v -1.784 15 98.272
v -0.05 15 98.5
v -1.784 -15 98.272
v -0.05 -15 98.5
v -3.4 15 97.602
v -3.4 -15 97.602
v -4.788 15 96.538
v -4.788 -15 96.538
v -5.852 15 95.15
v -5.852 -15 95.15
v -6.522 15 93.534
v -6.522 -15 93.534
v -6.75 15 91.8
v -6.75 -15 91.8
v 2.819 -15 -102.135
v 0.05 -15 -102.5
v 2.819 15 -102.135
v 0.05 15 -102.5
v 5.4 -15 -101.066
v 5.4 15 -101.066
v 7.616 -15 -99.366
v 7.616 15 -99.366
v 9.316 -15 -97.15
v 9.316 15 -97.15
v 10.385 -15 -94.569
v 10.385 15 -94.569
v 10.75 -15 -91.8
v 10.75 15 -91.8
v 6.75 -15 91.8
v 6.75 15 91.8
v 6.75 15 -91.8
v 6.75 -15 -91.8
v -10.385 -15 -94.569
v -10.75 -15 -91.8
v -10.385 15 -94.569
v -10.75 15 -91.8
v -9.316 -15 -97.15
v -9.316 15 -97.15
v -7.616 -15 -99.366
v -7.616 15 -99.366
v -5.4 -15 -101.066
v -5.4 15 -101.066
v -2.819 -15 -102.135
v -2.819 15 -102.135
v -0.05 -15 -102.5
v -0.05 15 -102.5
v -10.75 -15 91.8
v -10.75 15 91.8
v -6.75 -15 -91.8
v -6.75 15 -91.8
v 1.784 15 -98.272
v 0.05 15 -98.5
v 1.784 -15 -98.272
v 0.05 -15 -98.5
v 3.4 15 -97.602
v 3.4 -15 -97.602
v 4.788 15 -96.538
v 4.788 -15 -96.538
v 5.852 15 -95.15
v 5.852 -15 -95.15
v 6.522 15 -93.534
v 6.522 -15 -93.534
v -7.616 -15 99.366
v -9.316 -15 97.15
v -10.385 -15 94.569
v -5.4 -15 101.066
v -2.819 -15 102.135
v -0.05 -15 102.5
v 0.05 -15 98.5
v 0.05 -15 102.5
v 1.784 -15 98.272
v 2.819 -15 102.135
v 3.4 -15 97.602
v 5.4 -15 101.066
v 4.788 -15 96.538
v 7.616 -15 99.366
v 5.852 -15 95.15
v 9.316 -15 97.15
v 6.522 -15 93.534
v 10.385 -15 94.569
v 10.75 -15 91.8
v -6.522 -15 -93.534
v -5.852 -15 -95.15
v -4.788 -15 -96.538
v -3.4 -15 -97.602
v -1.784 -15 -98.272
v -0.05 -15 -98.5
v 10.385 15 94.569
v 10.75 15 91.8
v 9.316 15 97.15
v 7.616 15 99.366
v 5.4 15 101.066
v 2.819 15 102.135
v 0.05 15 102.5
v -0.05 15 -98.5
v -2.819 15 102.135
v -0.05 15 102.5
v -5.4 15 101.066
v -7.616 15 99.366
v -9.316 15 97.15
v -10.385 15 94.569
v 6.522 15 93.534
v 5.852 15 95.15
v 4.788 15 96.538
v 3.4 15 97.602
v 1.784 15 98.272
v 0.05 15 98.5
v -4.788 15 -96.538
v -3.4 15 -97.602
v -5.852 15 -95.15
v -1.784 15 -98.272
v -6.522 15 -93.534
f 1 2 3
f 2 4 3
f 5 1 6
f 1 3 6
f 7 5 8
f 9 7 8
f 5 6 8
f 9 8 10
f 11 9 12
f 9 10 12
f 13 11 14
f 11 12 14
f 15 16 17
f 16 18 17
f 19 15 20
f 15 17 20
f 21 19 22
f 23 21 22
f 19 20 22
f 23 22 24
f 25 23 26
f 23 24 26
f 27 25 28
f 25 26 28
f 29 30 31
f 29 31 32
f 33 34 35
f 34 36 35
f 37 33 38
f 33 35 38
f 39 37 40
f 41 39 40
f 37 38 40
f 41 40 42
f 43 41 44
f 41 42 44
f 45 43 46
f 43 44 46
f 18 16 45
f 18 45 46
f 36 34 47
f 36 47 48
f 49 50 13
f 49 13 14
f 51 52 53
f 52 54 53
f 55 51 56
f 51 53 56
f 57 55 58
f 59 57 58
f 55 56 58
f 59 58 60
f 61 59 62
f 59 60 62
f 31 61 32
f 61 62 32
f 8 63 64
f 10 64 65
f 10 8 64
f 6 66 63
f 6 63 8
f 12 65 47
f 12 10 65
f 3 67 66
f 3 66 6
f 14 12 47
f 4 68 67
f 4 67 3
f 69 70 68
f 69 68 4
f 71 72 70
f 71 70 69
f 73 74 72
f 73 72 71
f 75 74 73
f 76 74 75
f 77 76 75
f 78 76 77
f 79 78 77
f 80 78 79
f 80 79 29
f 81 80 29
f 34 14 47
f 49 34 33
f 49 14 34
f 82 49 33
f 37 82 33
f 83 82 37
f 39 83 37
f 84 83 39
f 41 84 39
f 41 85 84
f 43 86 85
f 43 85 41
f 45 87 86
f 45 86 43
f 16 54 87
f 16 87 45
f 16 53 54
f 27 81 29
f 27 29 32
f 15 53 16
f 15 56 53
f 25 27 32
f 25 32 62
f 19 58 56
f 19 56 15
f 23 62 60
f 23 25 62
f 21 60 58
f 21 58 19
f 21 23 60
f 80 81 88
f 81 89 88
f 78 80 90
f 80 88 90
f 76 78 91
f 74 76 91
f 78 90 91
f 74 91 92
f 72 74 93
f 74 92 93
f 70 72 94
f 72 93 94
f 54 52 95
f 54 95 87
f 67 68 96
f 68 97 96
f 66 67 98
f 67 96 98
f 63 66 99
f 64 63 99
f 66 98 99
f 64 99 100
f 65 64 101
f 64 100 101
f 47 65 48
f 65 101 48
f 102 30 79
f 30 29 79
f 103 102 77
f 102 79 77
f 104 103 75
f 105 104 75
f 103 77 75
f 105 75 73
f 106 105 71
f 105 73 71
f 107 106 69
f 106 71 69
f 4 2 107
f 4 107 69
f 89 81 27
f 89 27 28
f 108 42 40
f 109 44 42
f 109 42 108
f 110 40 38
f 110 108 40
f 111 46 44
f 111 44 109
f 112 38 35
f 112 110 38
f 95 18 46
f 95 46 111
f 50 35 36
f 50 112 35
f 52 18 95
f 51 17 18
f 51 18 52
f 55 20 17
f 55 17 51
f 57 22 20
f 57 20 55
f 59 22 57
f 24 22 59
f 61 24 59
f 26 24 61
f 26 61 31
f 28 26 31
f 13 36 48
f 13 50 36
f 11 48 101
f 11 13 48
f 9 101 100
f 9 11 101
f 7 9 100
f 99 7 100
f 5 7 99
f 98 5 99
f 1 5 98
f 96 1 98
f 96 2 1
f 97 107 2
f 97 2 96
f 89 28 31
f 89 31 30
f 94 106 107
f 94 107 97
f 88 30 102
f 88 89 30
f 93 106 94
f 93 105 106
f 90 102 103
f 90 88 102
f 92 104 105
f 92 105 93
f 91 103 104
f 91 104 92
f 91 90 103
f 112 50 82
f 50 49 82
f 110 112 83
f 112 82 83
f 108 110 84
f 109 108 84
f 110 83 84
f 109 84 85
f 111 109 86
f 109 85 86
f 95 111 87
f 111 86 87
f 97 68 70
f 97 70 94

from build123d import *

# Parameters (mm, degrees)
SKETCH3_W = 4
SKETCH3_H = 30


with BuildPart() as part:
    # Sweep1: sweep along a path in Sketch1
    with BuildLine(Plane(origin=(0, 0, 0), x_dir=(1, 0, 0), z_dir=(0, 1, 0))) as sweep1_path:
        Line((-0.05, 100.5), (0.05, 100.5))
        ThreePointArc((0.05, 100.5), (6.201828996, 97.951828996), (8.75, 91.8))
        Line((8.75, 91.8), (8.75, -91.8))
        ThreePointArc((8.75, -91.8), (6.201828996, -97.951828996), (0.05, -100.5))
        Line((0.05, -100.5), (-0.05, -100.5))
        ThreePointArc((-0.05, -100.5), (-6.201828996, -97.951828996), (-8.75, -91.8))
        Line((-8.75, -91.8), (-8.75, 91.8))
        ThreePointArc((-8.75, 91.8), (-6.201828996, 97.951828996), (-0.05, 100.5))
    # Sketch3 → Sweep1 (sweep)
    with BuildSketch(Plane.XY):
        with Locations((8.75, 0)):
            Rectangle(SKETCH3_W, SKETCH3_H)
    sweep(path=sweep1_path.line)


solid = part.part
